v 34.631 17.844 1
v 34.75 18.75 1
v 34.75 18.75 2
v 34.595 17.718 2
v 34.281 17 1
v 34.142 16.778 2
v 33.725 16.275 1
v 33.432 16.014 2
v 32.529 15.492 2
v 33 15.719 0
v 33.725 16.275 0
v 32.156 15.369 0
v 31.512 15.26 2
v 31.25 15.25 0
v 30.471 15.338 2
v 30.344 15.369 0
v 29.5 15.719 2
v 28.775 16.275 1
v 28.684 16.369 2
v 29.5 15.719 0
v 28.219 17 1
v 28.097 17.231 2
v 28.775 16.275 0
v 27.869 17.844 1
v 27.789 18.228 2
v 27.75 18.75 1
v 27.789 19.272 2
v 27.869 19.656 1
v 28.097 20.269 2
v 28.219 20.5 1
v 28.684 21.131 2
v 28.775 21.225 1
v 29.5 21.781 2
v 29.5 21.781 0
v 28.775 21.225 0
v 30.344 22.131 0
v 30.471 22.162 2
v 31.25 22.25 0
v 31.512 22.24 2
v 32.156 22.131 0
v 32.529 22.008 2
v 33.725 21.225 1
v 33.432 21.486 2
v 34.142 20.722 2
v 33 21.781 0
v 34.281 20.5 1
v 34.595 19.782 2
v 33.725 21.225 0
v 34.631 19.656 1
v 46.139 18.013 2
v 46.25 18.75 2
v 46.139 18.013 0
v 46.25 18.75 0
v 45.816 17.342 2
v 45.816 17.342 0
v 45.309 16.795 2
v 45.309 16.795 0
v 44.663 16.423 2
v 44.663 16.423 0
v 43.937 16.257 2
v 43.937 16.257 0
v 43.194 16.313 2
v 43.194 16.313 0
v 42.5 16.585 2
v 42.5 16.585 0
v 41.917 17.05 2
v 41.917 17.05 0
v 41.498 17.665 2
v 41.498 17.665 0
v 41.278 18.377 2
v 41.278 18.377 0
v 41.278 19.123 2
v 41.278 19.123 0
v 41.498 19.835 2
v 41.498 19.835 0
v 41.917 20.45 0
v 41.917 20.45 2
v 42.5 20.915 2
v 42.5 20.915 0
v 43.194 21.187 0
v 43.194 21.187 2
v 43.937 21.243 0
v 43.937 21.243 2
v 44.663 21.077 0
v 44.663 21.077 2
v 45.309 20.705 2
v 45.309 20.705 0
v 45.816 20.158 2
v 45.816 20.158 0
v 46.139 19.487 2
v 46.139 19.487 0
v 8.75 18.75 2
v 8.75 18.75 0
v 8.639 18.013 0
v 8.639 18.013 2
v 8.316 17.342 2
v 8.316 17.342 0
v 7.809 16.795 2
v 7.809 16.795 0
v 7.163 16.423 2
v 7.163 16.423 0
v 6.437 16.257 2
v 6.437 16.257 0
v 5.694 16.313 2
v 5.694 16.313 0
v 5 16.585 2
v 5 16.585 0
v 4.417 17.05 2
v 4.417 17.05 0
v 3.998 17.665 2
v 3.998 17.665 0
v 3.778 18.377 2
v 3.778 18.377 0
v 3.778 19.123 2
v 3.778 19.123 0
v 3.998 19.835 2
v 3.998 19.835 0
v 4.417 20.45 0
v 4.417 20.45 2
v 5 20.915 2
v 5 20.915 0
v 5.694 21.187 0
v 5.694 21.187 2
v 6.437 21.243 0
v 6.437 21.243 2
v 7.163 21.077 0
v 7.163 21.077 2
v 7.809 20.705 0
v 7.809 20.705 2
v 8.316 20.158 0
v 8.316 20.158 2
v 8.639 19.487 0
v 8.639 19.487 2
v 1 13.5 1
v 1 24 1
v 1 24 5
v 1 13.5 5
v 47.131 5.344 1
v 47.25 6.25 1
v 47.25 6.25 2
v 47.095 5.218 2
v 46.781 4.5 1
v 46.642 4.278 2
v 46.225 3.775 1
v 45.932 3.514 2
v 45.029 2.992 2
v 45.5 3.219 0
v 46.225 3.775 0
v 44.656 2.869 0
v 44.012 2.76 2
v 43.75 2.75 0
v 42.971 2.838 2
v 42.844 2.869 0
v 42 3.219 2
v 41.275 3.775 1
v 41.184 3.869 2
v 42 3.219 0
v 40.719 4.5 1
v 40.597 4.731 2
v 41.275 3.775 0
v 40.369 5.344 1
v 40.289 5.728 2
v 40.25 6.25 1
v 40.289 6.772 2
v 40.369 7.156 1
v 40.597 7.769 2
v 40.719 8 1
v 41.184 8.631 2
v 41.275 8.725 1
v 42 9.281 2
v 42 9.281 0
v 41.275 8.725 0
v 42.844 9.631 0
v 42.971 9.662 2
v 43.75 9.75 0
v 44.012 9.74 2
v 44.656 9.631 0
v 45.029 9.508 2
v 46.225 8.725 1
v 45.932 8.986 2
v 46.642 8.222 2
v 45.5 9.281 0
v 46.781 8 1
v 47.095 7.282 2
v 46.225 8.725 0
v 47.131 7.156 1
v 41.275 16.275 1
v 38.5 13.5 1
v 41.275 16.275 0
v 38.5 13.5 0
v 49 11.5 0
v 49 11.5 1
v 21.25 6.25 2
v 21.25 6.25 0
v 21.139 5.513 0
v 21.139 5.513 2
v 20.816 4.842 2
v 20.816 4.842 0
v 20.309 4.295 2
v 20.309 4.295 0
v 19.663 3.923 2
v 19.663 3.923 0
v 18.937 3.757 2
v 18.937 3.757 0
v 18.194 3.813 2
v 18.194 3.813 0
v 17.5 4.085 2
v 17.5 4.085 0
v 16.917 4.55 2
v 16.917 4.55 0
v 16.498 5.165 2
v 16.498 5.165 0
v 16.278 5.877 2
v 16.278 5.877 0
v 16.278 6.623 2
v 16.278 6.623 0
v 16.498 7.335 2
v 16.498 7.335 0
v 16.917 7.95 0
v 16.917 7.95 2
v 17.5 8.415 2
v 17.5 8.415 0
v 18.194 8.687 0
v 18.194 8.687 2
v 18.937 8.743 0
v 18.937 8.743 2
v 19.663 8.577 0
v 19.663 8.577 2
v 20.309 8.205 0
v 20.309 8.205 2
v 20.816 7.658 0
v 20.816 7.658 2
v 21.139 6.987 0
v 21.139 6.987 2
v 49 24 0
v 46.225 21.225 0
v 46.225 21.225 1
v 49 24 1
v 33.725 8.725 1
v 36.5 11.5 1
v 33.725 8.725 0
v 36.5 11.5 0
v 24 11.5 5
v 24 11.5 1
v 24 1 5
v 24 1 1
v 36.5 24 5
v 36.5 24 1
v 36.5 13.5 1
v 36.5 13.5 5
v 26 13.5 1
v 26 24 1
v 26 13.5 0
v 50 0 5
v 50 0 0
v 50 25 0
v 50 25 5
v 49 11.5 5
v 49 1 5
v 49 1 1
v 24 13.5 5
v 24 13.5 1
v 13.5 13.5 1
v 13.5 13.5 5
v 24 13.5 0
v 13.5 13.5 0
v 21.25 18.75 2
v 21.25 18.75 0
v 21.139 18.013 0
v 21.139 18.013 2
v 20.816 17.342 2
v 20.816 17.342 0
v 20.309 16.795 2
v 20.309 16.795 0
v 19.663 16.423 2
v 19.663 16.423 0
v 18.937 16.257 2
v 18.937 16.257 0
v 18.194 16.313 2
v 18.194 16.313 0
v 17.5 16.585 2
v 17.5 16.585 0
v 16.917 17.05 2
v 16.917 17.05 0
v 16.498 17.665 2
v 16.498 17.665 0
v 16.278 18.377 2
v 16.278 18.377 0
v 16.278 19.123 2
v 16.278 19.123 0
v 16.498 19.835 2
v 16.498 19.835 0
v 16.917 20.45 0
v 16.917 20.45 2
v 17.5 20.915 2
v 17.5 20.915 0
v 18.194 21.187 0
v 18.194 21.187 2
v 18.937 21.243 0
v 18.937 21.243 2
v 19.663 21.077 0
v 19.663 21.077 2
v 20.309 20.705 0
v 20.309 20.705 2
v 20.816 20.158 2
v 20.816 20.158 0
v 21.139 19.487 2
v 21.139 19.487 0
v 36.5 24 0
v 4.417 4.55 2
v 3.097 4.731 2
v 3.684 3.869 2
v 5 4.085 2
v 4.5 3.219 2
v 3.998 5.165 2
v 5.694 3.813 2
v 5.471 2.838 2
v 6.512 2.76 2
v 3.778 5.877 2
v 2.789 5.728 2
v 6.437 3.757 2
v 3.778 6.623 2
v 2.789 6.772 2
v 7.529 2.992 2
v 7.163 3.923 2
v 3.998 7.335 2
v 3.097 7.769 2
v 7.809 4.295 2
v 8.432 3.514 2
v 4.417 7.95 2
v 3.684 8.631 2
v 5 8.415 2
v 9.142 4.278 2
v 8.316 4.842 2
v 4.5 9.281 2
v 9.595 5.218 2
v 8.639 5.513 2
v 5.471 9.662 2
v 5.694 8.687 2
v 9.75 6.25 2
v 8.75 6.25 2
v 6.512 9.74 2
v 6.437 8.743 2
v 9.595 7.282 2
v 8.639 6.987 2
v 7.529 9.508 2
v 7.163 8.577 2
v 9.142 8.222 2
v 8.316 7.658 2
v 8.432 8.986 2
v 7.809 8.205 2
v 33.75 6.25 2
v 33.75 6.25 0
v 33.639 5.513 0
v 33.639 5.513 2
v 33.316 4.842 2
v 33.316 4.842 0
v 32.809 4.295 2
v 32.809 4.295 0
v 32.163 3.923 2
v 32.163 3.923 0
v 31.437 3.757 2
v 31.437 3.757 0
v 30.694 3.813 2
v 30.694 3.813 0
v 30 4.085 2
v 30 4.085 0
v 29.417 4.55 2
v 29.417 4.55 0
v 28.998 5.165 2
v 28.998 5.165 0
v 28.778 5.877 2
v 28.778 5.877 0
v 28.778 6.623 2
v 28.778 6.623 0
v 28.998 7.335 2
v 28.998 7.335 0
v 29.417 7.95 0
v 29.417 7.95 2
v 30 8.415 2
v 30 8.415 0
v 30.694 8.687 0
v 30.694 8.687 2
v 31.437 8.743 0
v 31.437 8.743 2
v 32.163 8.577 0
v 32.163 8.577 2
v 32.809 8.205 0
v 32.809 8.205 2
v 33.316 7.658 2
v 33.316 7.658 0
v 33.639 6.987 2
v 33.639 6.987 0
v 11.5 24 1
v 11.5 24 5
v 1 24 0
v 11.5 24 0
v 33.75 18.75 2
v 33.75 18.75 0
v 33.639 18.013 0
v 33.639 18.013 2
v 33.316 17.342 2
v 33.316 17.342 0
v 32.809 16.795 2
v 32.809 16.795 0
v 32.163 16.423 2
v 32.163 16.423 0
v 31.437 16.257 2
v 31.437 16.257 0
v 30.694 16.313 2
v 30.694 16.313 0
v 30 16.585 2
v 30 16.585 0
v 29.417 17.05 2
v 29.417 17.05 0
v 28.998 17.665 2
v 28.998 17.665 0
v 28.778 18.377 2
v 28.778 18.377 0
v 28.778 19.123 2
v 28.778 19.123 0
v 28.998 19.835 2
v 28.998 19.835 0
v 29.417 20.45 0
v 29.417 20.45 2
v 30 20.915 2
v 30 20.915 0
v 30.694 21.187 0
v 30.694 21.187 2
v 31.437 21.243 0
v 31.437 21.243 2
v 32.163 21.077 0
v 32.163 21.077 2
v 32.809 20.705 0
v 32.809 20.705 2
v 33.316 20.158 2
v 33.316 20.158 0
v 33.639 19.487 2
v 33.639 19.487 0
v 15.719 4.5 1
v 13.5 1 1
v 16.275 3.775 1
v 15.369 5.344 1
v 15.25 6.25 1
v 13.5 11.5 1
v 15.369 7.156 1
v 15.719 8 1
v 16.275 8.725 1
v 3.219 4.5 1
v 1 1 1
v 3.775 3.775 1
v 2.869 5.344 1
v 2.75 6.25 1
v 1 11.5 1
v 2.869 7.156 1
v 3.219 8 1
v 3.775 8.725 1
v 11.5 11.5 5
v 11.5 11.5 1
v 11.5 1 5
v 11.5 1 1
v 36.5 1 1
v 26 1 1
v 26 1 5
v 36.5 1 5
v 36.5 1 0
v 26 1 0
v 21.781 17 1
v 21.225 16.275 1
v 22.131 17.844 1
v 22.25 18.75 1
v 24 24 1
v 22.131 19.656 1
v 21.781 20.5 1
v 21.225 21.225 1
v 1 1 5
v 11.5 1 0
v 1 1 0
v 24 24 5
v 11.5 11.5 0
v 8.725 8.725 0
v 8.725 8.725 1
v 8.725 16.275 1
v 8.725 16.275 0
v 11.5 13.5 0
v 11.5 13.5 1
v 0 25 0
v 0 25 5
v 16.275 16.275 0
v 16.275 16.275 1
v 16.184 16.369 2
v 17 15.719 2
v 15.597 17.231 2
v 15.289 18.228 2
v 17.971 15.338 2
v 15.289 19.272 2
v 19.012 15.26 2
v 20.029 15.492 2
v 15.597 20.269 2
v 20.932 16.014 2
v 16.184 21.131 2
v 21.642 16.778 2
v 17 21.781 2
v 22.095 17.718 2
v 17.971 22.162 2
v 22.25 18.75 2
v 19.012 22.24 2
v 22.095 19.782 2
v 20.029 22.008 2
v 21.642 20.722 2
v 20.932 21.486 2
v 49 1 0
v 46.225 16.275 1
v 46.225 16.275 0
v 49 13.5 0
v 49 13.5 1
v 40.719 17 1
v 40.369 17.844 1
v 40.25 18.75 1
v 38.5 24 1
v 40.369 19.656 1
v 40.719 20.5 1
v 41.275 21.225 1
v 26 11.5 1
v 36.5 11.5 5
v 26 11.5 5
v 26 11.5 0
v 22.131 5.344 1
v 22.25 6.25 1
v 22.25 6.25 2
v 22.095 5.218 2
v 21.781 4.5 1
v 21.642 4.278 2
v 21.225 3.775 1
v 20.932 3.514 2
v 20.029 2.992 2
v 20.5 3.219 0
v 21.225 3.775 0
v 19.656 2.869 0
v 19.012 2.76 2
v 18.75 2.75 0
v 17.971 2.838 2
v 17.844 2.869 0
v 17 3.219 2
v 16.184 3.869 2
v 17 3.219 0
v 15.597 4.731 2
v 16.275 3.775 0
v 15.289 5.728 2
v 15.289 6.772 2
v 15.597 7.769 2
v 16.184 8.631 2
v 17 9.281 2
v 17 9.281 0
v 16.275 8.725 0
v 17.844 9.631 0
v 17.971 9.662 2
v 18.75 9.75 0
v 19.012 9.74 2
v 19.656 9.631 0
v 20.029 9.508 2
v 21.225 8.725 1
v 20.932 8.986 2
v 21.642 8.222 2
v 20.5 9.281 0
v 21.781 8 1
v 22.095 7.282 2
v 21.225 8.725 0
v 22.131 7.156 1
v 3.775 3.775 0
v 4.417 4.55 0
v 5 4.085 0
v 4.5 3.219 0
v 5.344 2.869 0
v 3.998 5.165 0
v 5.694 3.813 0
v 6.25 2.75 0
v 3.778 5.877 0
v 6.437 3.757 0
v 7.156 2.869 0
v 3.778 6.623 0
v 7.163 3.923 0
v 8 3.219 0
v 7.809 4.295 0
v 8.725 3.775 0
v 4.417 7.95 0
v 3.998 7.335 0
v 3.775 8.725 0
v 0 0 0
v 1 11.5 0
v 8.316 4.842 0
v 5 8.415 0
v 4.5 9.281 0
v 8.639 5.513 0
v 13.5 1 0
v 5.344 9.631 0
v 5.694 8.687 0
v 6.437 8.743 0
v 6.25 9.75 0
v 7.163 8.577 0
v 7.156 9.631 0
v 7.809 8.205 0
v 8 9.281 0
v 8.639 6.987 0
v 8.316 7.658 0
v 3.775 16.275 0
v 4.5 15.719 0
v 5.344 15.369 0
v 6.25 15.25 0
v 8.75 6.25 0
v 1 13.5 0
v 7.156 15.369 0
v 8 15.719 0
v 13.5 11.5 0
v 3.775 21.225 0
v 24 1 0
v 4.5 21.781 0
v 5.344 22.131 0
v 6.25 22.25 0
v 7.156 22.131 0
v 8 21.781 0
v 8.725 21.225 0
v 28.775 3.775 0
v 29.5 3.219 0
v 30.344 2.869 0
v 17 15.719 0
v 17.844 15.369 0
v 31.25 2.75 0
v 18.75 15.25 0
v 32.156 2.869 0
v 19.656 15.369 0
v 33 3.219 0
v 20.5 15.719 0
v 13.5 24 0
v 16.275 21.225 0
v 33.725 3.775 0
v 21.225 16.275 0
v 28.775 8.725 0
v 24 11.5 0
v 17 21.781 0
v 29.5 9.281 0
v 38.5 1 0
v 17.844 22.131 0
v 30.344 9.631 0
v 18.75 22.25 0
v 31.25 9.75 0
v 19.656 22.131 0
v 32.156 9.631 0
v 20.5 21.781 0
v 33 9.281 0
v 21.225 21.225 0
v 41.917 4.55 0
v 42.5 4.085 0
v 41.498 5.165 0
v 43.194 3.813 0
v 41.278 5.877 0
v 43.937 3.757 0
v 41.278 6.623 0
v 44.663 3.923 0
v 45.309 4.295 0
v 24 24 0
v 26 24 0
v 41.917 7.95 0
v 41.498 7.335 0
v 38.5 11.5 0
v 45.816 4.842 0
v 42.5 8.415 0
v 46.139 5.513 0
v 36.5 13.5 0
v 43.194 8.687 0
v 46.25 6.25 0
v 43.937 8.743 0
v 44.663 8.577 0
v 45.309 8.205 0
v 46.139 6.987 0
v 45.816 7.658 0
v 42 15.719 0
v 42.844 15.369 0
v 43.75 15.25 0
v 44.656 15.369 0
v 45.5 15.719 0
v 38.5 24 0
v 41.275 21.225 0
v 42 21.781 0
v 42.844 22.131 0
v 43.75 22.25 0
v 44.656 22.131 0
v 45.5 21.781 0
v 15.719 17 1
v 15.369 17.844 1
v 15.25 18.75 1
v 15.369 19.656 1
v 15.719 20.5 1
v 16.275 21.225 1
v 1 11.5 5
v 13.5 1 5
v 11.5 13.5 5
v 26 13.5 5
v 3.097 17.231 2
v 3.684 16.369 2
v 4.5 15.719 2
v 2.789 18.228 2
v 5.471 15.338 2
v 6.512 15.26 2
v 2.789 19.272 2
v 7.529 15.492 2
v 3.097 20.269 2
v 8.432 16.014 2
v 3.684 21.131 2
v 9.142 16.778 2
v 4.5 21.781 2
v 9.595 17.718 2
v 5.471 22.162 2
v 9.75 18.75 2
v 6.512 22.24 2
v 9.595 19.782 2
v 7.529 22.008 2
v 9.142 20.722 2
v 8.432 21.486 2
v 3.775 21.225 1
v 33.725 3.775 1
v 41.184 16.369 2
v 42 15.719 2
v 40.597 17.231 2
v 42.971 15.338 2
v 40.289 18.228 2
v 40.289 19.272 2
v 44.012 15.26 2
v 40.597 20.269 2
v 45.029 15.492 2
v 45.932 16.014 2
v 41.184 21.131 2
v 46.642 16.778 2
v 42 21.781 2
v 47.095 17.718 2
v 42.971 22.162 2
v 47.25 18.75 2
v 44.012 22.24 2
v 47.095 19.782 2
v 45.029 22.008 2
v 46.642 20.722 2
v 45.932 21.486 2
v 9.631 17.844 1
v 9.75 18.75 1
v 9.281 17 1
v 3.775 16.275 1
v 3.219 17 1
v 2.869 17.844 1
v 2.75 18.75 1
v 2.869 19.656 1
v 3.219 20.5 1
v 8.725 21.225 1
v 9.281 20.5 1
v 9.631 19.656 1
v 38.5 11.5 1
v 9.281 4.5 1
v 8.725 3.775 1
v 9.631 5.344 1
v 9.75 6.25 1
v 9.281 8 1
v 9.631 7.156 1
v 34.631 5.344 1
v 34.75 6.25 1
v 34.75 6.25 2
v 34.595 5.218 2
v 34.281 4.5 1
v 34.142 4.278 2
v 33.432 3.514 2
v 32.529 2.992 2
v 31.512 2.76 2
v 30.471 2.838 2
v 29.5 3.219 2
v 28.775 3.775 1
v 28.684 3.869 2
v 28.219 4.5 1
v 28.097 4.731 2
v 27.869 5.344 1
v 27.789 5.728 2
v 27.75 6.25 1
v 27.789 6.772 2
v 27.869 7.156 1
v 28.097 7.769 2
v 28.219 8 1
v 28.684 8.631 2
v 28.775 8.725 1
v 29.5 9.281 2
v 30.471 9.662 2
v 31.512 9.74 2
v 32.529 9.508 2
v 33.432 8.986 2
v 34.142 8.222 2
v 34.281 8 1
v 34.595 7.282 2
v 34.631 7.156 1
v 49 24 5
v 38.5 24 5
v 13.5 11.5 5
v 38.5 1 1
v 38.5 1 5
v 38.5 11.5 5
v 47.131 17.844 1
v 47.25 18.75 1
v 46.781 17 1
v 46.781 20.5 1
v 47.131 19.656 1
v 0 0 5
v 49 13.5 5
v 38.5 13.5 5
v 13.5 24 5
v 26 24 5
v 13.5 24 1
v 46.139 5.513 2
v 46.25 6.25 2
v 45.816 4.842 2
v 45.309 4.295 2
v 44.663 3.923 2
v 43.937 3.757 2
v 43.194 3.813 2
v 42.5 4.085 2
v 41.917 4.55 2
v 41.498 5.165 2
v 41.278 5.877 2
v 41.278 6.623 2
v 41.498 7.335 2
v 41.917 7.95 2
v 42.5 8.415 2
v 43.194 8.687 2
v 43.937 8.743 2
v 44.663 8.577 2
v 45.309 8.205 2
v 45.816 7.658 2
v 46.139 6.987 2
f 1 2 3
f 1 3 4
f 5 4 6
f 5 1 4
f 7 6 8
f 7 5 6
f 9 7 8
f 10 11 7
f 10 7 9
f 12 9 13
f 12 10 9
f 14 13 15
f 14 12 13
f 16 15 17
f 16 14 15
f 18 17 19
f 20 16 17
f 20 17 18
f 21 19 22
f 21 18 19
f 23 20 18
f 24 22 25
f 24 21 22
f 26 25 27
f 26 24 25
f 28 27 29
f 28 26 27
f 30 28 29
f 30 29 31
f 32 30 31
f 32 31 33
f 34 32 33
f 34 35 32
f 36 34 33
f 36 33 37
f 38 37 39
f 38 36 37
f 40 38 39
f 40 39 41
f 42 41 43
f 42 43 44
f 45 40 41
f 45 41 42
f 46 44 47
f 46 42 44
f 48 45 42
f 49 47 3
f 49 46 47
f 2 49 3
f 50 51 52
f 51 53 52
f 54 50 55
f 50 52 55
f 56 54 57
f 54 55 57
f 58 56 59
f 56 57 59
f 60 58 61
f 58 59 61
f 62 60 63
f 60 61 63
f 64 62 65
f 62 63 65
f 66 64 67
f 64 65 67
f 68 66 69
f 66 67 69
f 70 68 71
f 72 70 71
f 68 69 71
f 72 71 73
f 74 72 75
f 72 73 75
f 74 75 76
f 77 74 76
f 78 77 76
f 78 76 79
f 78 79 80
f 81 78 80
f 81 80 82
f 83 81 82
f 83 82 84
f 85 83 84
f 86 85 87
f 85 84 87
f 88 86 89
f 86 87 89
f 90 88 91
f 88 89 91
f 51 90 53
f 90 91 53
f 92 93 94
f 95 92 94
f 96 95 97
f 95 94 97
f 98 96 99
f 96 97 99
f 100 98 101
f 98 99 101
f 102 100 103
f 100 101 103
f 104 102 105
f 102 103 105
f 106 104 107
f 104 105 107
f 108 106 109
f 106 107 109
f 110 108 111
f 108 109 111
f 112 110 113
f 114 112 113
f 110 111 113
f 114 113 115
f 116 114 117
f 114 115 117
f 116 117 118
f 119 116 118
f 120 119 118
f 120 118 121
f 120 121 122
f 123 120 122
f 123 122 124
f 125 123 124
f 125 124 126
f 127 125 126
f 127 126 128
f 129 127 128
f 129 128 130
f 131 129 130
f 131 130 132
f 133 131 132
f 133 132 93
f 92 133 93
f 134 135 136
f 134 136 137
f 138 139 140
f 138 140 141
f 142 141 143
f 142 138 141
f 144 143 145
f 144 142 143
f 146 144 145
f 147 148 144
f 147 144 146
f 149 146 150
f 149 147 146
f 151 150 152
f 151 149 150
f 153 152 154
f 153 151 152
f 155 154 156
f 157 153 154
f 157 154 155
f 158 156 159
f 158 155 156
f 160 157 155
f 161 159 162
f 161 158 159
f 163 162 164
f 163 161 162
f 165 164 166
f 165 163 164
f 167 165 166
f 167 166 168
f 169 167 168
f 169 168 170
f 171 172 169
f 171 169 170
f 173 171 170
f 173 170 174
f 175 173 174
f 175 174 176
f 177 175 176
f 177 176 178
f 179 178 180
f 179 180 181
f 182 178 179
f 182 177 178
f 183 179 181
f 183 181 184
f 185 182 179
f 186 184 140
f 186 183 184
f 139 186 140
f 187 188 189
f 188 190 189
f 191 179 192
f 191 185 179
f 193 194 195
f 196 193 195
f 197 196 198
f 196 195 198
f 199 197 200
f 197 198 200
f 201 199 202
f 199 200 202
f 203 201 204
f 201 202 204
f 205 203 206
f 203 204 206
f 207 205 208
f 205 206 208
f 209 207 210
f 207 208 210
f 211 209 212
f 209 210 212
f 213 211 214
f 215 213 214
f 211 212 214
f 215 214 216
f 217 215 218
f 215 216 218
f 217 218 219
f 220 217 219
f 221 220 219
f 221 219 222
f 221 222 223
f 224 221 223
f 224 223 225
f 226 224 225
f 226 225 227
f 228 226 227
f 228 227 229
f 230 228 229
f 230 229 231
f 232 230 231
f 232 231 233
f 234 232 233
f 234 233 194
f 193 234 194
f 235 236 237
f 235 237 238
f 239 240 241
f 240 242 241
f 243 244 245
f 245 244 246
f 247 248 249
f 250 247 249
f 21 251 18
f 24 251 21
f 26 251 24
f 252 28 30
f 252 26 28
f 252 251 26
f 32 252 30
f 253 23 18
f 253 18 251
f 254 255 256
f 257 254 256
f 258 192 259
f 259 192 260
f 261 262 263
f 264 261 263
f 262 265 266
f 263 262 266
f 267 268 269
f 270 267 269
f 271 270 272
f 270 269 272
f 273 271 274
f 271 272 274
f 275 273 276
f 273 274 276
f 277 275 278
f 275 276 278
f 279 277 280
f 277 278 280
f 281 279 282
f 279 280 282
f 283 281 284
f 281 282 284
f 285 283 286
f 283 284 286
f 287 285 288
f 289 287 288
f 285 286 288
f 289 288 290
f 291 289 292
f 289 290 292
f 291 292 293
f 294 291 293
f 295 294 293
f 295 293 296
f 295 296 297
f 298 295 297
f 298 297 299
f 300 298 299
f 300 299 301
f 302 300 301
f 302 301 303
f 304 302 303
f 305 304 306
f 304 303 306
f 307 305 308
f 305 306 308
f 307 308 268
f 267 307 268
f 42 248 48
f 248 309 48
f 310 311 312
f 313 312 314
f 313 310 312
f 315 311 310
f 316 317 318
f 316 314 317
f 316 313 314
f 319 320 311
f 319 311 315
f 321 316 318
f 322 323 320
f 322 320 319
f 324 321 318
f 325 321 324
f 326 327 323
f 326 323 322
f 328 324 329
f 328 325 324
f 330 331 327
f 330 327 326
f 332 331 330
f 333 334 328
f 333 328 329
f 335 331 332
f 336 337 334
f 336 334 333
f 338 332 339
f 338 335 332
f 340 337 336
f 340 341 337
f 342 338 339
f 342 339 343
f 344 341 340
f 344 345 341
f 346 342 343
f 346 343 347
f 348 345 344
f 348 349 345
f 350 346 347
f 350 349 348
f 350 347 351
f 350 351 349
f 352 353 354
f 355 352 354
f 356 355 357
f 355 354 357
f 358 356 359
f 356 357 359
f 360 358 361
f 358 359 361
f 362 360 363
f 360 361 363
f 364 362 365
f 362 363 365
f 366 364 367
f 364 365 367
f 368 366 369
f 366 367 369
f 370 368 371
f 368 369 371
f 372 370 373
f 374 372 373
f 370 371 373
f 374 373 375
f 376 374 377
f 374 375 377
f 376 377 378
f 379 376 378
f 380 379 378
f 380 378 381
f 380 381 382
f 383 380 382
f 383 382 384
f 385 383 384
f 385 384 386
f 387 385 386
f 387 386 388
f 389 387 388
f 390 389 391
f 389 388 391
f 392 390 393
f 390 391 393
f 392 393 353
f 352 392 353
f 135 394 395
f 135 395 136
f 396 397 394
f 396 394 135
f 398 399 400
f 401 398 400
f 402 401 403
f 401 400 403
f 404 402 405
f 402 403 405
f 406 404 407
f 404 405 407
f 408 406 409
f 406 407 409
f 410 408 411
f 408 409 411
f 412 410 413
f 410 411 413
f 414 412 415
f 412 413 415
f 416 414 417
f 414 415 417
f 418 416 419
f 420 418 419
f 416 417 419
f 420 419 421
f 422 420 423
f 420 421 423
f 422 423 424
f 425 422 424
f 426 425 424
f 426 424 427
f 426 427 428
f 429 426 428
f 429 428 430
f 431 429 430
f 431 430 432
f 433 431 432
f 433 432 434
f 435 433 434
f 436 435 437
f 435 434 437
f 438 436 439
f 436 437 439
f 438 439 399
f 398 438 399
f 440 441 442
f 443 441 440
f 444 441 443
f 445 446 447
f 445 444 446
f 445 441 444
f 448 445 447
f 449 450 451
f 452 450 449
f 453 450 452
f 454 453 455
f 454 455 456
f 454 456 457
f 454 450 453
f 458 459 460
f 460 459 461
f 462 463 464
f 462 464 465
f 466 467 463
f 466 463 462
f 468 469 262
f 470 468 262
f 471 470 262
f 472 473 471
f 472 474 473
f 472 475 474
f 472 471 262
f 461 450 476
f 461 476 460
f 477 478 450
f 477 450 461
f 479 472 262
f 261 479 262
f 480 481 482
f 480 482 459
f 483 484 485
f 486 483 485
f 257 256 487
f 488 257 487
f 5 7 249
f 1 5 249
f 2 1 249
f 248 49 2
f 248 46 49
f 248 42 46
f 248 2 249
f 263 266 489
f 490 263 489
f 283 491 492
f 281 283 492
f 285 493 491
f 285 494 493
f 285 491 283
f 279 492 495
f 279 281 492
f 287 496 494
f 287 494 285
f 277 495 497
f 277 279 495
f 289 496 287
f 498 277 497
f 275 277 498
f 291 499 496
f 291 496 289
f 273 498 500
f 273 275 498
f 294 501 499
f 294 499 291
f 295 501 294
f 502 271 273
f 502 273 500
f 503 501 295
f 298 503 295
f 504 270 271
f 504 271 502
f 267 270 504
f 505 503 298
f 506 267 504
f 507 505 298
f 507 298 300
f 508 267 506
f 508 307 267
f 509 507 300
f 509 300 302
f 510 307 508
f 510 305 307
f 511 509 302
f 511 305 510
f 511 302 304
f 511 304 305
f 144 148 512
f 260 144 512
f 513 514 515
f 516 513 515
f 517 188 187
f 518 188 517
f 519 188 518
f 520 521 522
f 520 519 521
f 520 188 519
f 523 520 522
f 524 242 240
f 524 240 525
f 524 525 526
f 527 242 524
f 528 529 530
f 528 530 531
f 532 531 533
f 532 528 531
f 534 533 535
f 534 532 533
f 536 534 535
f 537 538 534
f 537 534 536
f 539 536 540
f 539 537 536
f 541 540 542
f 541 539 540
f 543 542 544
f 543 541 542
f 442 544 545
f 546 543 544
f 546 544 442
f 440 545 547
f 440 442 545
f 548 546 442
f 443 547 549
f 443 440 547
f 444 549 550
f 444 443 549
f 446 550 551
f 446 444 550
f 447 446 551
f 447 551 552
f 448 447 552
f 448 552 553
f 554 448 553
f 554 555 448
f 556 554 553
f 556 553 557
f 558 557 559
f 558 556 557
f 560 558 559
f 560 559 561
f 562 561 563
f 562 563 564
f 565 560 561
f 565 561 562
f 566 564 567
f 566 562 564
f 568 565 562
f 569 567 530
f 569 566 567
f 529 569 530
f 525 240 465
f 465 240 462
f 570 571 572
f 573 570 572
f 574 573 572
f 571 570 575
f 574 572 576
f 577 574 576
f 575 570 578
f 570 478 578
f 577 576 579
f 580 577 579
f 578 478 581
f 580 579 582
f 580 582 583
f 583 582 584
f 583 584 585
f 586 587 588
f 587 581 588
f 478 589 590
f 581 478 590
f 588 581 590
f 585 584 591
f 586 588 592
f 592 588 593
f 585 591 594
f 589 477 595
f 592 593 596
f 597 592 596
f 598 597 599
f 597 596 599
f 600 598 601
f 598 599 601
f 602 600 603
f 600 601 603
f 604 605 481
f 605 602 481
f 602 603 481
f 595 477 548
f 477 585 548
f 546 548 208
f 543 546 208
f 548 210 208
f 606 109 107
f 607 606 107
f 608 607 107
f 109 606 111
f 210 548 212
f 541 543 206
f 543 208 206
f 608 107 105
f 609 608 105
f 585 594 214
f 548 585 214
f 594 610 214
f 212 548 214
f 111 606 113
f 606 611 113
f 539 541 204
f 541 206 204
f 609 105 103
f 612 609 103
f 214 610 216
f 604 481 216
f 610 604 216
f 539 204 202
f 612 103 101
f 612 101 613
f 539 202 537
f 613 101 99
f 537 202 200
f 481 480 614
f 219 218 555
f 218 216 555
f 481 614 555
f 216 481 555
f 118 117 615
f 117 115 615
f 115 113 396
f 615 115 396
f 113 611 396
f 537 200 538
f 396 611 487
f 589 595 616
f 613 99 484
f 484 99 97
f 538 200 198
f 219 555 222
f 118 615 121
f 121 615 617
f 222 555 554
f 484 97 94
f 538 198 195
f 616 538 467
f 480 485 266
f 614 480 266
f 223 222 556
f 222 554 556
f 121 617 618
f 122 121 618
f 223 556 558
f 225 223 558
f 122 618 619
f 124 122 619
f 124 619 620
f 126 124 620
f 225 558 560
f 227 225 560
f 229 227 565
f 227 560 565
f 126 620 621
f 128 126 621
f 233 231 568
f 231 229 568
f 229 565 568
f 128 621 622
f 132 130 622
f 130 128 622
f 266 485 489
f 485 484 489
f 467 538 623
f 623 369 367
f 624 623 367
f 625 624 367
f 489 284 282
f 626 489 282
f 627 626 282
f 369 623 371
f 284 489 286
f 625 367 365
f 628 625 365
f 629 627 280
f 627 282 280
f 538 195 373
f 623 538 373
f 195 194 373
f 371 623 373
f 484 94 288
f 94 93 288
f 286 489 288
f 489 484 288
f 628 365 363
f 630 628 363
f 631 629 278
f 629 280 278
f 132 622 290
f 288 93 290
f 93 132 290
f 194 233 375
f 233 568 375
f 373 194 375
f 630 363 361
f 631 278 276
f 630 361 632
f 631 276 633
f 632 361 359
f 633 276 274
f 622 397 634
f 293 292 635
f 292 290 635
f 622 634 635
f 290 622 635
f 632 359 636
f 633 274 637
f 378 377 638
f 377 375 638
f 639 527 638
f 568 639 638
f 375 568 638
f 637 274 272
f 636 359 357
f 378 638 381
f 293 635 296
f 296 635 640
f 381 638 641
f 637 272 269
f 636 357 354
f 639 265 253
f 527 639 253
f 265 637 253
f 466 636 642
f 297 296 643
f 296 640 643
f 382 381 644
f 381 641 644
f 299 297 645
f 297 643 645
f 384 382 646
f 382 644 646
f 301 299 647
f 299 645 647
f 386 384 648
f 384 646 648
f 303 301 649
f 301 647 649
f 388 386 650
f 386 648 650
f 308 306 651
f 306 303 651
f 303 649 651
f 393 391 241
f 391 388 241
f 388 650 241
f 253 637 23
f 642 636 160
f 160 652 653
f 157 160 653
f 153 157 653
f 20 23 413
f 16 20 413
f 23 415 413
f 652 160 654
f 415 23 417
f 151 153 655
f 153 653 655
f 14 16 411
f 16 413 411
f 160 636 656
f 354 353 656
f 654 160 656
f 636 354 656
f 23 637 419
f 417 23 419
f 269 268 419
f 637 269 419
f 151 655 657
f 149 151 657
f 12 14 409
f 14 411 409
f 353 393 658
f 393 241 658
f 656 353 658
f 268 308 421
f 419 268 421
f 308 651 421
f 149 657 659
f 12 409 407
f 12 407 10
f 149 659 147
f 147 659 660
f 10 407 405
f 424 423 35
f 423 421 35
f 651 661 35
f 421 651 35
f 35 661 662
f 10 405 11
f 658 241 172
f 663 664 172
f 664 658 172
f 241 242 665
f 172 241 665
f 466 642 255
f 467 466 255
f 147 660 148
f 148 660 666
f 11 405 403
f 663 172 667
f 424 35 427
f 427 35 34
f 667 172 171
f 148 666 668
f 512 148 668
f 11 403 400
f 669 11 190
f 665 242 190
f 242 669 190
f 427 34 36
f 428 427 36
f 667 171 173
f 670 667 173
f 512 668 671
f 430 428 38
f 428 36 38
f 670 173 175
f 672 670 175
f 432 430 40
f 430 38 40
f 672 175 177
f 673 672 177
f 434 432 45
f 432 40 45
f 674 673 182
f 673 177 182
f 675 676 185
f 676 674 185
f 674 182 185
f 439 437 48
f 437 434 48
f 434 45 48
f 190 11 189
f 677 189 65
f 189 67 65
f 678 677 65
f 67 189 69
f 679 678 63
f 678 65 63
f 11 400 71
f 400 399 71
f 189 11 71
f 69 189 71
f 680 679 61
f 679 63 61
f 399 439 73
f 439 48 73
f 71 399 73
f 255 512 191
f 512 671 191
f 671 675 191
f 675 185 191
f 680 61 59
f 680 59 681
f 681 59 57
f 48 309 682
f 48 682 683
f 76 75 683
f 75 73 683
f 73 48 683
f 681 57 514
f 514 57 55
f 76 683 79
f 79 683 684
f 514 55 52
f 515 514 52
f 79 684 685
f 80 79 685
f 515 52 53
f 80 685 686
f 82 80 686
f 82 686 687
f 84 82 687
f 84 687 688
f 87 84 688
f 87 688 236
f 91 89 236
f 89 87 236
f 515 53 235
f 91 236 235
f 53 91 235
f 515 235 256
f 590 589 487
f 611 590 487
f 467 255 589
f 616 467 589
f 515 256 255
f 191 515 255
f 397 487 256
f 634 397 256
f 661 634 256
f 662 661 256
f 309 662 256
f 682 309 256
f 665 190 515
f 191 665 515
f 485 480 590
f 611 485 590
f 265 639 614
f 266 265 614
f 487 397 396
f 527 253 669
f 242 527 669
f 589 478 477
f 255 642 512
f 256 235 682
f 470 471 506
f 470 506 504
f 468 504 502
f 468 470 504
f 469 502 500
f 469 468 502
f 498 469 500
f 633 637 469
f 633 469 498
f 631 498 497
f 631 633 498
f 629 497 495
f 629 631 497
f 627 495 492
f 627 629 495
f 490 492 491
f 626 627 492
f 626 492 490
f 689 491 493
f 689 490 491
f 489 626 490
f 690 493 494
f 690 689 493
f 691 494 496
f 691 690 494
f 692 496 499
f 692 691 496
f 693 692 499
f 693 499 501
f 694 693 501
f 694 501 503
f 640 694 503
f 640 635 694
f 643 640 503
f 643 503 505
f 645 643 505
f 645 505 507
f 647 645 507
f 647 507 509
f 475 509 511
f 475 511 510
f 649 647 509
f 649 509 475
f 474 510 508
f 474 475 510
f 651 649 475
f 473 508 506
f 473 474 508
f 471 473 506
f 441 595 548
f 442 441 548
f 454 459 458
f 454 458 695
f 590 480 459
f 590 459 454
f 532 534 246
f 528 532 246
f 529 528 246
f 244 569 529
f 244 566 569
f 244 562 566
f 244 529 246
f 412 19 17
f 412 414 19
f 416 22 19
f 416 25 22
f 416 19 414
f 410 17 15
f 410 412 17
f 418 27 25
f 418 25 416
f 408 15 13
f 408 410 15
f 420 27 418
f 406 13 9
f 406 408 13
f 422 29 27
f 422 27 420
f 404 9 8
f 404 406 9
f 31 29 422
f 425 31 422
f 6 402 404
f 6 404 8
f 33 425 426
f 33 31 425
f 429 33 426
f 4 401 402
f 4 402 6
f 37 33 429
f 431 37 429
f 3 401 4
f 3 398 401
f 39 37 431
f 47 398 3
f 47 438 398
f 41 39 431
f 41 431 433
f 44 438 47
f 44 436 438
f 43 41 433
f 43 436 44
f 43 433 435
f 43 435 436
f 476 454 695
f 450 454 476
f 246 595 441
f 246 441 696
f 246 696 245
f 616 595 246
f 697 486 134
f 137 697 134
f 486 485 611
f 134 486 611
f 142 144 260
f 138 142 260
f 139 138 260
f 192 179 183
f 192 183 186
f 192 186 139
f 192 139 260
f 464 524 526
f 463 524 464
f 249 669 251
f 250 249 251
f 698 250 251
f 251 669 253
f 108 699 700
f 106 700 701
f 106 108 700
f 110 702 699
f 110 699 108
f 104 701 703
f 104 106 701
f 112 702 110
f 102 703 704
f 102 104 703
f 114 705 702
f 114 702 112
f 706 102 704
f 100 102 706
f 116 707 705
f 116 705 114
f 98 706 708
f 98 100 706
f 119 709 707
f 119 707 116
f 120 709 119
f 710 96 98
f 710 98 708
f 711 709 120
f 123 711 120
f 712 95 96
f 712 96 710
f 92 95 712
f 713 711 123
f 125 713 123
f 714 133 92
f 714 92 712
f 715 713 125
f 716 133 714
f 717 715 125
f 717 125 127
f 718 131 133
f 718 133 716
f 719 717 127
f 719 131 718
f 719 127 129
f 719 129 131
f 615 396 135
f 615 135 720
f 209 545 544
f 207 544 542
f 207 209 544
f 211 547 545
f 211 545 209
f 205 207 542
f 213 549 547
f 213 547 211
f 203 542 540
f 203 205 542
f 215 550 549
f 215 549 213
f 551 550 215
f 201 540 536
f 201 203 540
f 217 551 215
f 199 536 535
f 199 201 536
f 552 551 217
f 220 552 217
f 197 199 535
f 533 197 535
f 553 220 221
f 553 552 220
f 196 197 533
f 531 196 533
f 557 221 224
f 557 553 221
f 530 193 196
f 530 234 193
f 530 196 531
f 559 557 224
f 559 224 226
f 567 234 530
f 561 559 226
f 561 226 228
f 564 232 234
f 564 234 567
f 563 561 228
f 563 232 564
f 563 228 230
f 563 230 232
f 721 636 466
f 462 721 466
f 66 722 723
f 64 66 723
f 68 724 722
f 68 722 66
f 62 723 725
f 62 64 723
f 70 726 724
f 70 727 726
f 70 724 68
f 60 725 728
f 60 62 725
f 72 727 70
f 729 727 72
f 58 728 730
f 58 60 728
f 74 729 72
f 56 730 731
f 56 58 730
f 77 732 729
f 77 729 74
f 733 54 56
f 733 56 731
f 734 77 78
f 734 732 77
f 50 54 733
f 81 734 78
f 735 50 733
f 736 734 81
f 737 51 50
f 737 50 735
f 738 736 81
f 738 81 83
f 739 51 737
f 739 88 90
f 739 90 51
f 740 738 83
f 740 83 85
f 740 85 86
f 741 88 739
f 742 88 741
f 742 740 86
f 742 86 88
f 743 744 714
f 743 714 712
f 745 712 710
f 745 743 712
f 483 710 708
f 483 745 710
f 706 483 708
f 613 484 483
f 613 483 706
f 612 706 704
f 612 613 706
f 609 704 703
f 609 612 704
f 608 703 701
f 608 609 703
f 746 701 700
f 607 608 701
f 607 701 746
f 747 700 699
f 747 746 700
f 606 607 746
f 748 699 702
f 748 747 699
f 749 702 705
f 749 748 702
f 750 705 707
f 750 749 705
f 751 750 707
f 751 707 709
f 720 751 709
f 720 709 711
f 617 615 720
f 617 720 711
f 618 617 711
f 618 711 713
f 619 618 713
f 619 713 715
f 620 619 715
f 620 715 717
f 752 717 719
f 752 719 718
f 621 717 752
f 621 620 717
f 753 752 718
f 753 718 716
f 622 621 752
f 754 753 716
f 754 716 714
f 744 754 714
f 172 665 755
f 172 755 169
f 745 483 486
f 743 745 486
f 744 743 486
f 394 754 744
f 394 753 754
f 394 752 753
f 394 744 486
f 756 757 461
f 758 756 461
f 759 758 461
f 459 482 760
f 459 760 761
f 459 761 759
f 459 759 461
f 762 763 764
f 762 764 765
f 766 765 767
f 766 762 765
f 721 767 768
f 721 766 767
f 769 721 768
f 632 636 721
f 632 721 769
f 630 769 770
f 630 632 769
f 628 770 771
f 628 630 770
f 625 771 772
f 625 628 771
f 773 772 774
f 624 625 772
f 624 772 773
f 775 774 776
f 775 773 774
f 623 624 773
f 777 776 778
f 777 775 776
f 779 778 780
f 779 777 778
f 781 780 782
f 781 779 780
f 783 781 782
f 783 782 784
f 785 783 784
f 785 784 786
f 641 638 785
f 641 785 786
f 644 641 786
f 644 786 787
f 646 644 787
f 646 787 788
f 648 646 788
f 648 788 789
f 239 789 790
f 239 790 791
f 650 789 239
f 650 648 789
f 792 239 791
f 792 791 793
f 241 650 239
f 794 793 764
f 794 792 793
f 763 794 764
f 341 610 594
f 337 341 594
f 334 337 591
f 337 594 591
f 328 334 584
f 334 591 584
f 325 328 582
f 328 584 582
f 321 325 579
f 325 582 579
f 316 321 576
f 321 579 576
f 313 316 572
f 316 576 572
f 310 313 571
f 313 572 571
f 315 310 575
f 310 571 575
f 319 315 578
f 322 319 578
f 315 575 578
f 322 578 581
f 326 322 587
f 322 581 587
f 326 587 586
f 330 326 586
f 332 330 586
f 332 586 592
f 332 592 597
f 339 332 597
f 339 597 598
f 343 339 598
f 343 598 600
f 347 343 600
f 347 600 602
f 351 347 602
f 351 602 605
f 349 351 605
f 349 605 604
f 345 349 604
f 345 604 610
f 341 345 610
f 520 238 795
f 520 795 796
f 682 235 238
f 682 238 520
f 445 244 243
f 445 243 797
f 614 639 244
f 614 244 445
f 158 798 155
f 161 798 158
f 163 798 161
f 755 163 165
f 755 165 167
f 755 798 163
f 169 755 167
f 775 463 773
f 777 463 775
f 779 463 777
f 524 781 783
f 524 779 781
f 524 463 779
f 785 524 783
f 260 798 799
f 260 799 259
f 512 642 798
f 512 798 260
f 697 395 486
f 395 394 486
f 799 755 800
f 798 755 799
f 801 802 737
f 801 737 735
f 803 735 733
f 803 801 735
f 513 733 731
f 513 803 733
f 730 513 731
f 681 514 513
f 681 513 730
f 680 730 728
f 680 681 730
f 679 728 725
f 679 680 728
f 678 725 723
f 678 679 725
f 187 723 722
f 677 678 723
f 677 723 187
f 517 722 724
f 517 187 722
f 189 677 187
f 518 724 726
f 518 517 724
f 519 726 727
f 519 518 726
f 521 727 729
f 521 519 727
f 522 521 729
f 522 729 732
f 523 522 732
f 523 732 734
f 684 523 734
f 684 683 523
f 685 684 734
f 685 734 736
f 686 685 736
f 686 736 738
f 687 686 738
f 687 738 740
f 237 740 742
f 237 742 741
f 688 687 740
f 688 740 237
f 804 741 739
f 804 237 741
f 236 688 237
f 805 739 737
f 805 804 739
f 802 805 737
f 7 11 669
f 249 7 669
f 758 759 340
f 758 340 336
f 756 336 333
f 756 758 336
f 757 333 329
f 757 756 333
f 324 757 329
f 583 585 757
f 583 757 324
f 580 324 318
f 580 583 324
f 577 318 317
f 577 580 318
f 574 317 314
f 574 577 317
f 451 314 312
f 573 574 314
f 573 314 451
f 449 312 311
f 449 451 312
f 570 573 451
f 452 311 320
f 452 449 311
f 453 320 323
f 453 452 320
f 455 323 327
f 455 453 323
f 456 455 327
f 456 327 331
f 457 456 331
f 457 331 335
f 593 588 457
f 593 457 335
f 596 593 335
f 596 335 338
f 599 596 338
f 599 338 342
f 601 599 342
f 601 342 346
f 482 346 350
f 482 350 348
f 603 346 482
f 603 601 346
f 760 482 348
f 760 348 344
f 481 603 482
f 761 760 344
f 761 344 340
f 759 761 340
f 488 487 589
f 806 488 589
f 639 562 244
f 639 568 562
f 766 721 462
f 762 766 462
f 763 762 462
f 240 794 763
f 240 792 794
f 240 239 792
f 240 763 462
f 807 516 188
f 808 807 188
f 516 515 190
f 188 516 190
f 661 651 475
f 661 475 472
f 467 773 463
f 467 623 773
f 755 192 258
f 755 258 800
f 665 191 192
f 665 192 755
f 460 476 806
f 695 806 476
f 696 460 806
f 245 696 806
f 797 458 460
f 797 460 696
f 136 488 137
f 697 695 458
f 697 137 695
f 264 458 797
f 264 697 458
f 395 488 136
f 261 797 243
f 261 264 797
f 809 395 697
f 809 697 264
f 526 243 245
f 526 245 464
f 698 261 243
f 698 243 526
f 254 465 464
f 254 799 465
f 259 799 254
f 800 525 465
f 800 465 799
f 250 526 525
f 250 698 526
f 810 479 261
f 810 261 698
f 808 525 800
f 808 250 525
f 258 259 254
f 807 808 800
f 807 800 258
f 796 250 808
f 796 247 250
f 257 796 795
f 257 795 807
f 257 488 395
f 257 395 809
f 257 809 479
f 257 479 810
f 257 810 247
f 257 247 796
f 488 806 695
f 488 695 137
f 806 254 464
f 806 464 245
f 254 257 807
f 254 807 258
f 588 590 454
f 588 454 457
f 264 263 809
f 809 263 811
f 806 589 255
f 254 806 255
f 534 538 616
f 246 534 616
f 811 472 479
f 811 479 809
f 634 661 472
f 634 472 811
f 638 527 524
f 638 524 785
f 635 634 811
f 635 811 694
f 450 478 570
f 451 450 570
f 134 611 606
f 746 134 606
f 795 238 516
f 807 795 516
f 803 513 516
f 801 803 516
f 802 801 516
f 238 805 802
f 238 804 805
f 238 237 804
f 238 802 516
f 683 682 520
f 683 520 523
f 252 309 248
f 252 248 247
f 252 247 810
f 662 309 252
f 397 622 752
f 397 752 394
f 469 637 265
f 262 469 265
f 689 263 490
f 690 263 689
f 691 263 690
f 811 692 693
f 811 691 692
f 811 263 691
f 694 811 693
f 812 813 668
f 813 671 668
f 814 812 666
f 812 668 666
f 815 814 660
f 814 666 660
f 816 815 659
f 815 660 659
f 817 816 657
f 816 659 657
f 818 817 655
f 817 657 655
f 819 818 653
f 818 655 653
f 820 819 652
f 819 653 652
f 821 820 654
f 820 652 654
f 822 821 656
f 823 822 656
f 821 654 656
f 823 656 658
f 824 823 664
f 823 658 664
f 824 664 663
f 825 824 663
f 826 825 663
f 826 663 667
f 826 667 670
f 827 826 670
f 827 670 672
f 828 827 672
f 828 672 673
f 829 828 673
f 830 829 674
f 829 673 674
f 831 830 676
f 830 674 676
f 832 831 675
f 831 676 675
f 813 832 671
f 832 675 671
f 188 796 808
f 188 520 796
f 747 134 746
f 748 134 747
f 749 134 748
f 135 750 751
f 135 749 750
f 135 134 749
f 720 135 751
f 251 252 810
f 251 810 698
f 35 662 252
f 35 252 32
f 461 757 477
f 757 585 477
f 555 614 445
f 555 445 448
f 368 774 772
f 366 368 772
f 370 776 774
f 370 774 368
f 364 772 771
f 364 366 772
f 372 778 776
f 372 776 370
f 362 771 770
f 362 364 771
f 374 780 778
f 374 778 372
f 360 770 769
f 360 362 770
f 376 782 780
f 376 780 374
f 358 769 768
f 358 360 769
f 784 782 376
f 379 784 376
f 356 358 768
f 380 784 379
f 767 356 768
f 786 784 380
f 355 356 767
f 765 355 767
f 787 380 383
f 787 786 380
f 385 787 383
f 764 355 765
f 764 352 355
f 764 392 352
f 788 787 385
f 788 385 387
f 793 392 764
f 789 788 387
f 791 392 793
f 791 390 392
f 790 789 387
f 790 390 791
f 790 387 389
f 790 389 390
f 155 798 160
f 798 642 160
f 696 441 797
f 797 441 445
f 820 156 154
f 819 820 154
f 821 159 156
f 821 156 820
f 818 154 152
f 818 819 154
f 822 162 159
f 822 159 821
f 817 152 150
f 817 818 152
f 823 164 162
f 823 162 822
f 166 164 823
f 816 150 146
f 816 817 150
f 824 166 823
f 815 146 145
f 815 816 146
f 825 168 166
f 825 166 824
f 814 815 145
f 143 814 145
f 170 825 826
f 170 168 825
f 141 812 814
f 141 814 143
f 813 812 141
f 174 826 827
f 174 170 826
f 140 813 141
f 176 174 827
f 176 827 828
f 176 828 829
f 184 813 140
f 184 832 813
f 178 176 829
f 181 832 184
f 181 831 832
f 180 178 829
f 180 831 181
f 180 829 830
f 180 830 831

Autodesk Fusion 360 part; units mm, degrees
sketch "Sketch1" plane through (0, 0, 0) normal (0, 0, 1) x (1, 0, 0)
  line L0 (0, 0) -> (50, 0)
  line L1 (50, 0) -> (50, 25)
  line L2 (50, 25) -> (0, 25)
  line L3 (0, 25) -> (0, 0)
  line L4 (-2.5, -2.5) -> (52.5, -2.5)
  line L5 (52.5, -2.5) -> (52.5, 27.5)
  line L6 (52.5, 27.5) -> (-2.5, 27.5)
  line L7 (-2.5, 27.5) -> (-2.5, -2.5)
  line L8 (0, 25) -> (12.5, 25)
  line L9 (12.5, 25) -> (12.5, 12.5)
  line L10 (12.5, 12.5) -> (0, 12.5)
  line L11 (0, 12.5) -> (0, 25)
  line L12 (12.5, 12.5) -> (0, 12.5)
  line L13 (0, 12.5) -> (0, 0)
  line L14 (0, 0) -> (12.5, 0)
  line L15 (12.5, 0) -> (12.5, 12.5)
  line L16 (12.5, 12.5) -> (25, 12.5)
  line L17 (25, 12.5) -> (25, 25)
  line L18 (25, 25) -> (12.5, 25)
  line L19 (12.5, 25) -> (12.5, 12.5)
  line L20 (12.5, 12.5) -> (25, 12.5)
  line L21 (25, 12.5) -> (25, 0)
  line L22 (25, 0) -> (12.5, 0)
  line L23 (12.5, 0) -> (12.5, 12.5)
  line L24 (25, 12.5) -> (37.5, 12.5)
  line L25 (37.5, 12.5) -> (37.5, 25)
  line L26 (37.5, 25) -> (25, 25)
  line L27 (25, 25) -> (25, 12.5)
  line L28 (37.5, 12.5) -> (25, 12.5)
  line L29 (25, 12.5) -> (25, 0)
  line L30 (25, 0) -> (37.5, 0)
  line L31 (37.5, 0) -> (37.5, 12.5)
  line L32 (37.5, 12.5) -> (50, 12.5)
  line L33 (50, 12.5) -> (50, 0)
  line L34 (50, 0) -> (37.5, 0)
  line L35 (37.5, 0) -> (37.5, 12.5)
  line L36 (0, 25) -> (1, 25)
  line L37 (1, 25) -> (1, 0)
  line L38 (1, 0) -> (0, 0)
  line L39 (0, 0) -> (0, 25)
  line L40 (0, 25) -> (50, 25)
  line L41 (50, 25) -> (50, 24)
  line L42 (50, 24) -> (0, 24)
  line L43 (0, 24) -> (0, 25)
  line L44 (50, 0) -> (0, 0)
  line L45 (0, 0) -> (0, 1)
  line L46 (0, 1) -> (50, 1)
  line L47 (50, 1) -> (50, 0)
  line L48 (50, 25) -> (49, 25)
  line L49 (49, 25) -> (49, 0)
  line L50 (49, 0) -> (50, 0)
  line L51 (50, 0) -> (50, 25)
  line L52 (0, 12.5) -> (50, 12.5)
  line L53 (50, 12.5) -> (50, 11.5)
  line L54 (50, 11.5) -> (0, 11.5)
  line L55 (0, 11.5) -> (0, 12.5)
  line L56 (0, 12.5) -> (50, 12.5)
  line L57 (50, 12.5) -> (50, 13.5)
  line L58 (50, 13.5) -> (0, 13.5)
  line L59 (0, 13.5) -> (0, 12.5)
  line L60 (50, 25) -> (49, 25)
  line L61 (49, 25) -> (49, 0)
  line L62 (49, 0) -> (50, 0)
  line L63 (50, 0) -> (50, 25)
  line L64 (12.5, 0) -> (13.5, 0)
  line L65 (13.5, 0) -> (13.5, 25)
  line L66 (13.5, 25) -> (12.5, 25)
  line L67 (12.5, 25) -> (12.5, 0)
  line L68 (12.5, 25) -> (11.5, 25)
  line L69 (11.5, 25) -> (11.5, 0)
  line L70 (11.5, 0) -> (12.5, 0)
  line L71 (12.5, 0) -> (12.5, 25)
  line L72 (25, 25) -> (26, 25)
  line L73 (26, 25) -> (26, 0)
  line L74 (26, 0) -> (25, 0)
  line L75 (25, 0) -> (25, 25)
  line L76 (25, 25) -> (24, 25)
  line L77 (24, 25) -> (24, 0)
  line L78 (24, 0) -> (25, 0)
  line L79 (25, 0) -> (25, 25)
  line L80 (37.5, 25) -> (38.5, 25)
  line L81 (38.5, 25) -> (38.5, 0)
  line L82 (38.5, 0) -> (37.5, 0)
  line L83 (37.5, 0) -> (37.5, 25)
  line L84 (37.5, 25) -> (36.5, 25)
  line L85 (36.5, 25) -> (36.5, 0)
  line L86 (36.5, 0) -> (37.5, 0)
  line L87 (37.5, 0) -> (37.5, 25)
  line L88 (1, 24) -> (11.5, 13.5)
  line L89 (1, 13.5) -> (11.5, 24)
  line L90 (1, 11.5) -> (11.5, 1)
  line L91 (1, 1) -> (11.5, 11.5)
  line L92 (13.5, 24) -> (24, 13.5)
  line L93 (13.5, 13.5) -> (24, 24)
  line L94 (13.5, 11.5) -> (24, 1)
  line L95 (13.5, 1) -> (24, 11.5)
  line L96 (26, 11.5) -> (36.5, 1)
  line L97 (26, 1) -> (26, 1.4048)
  line L98 (36.5, 11.5) -> (26, 1)
  line L99 (36.5, 24) -> (26, 13.5)
  line L100 (26, 24) -> (36.5, 13.5)
  line L101 (38.5, 24) -> (49, 13.5)
  line L102 (38.5, 13.5) -> (49, 24)
  line L103 (38.5, 11.5) -> (49, 1)
  line L104 (38.5, 1) -> (49, 11.5)
  circle A0 centre (6.25, 18.75) radius 2.5
  circle A1 centre (18.75, 18.75) radius 2.5
  circle A2 centre (31.25, 18.75) radius 2.5
  circle A3 centre (43.75, 18.75) radius 2.5
  circle A4 centre (43.75, 6.25) radius 2.5
  circle A5 centre (31.25, 6.25) radius 2.5
  circle A6 centre (18.75, 6.25) radius 2.5
  circle A7 centre (6.25, 6.25) radius 2.5
  circle A8 centre (18.75, 6.25) radius 3.5
  circle A9 centre (31.25, 6.25) radius 3.5
  circle A10 centre (31.25, 18.75) radius 3.5
  circle A11 centre (18.75, 18.75) radius 3.5
  circle A12 centre (6.25, 18.75) radius 3.5
  circle A13 centre (43.75, 18.75) radius 3.5
  circle A14 centre (6.25, 6.25) radius 3.5
  circle A15 centre (43.75, 6.25) radius 3.5
  dimension "d1" = 50
  dimension "d2" = 25
  dimension "d3" = 2.5
  dimension "d4" = 12.5
  dimension "d5" = 12.5
  dimension "d6" = 12.5
  dimension "d7" = 12.5
  dimension "d8" = 12.5
  dimension "d9" = 12.5
  dimension "d10" = 12.5
  dimension "d11" = 12.5
  dimension "d12" = 12.5
  dimension "d13" = 12.5
  dimension "d14" = 12.5
  dimension "d15" = 1
  dimension "d16" = 1
  dimension "d17" = 1
  dimension "d18" = 1
  dimension "d19" = 25
  dimension "d20" = 50
  dimension "d21" = 1
  dimension "d22" = 50
  dimension "d23" = 1
  dimension "d24" = 1
  dimension "d25" = 1
  dimension "d26" = 25
  dimension "d27" = 1
  dimension "d28" = 1
  dimension "d29" = 1
  dimension "d30" = 1
  dimension "d31" = 5
  dimension "d32" = 5
  dimension "d33" = 5
  dimension "d34" = 5
  dimension "d35" = 5
  dimension "d36" = 5
  dimension "d37" = 5
  dimension "d38" = 5
  dimension "d39" = 1
  dimension "d40" = 1
  dimension "d41" = 1
  dimension "d42" = 1
  dimension "d43" = 1
  dimension "d44" = 1
  dimension "d51" = 1
  dimension "d52" = 1
extrude "Extrude2" add sketch "Sketch1" along normal blind 5 contours L0 L3 L13 L14 L37 L38 L39 L44 L45 L46 | L0 L14 L37 L44 L46 L69 | L3 L13 L37 L39 L46 L54 | L0 L14 L15 L23 L44 L46 L67 L69 L70 L71 | L3 L10 L12 L13 L37 L39 L52 L54 L55 L56 | L0 L15 L22 L23 L44 L46 L64 L65 L67 L71 | L15 L23 L46 L54 L67 L69 L71 | L10 L12 L37 L52 L54 L56 L69 | L3 L10 L11 L12 L37 L39 L52 L56 L58 L59 | L0 L22 L44 L46 L65 L77 | L15 L23 L46 L54 L65 L67 L71 | L10 L12 L15 L23 L52 L54 L56 L67 L69 L71 | L10 L12 L37 L52 L56 L58 L69 | L3 L11 L37 L39 L42 L58 | L0 L21 L22 L29 L44 L46 L75 L77 L78 L79 | L15 L16 L20 L23 L52 L54 L56 L65 L67 L71 | L9 L10 L12 L19 L52 L56 L58 L67 L69 L71 | L2 L3 L8 L11 L36 L37 L39 L40 L42 L43 | L0 L21 L29 L30 L44 L46 L73 L74 L75 L79 | L21 L29 L46 L54 L75 L77 L79 | L16 L20 L52 L54 L56 L65 L77 | L9 L16 L19 L20 L52 L56 L58 L65 L67 L71 | L9 L19 L42 L58 L67 L69 L71 | L2 L8 L37 L40 L42 L69 | L0 L30 L44 L46 L73 L85 | L21 L29 L46 L54 L73 L75 L79 L97 | L16 L20 L21 L29 L52 L54 L56 L75 L77 L79 | L16 L20 L52 L56 L58 L65 L77 | L9 L19 L42 L58 L65 L67 L71 | L2 L8 L9 L19 L40 L42 L67 L68 L69 L71 | L0 L30 L31 L35 L44 L46 L83 L85 L86 L87 | L21 L24 L28 L29 L52 L54 L56 L73 L75 L79 | L16 L17 L20 L27 L52 L56 L58 L75 L77 L79 | L2 L9 L18 L19 L40 L42 L65 L66 L67 L71 | L0 L31 L34 L35 L44 L46 L81 L82 L83 L87 | L31 L35 L46 L54 L83 L85 L87 | L17 L24 L27 L28 L52 L56 L58 L73 L75 L79 | L24 L28 L52 L54 L56 L73 L85 | L17 L27 L42 L58 L75 L77 L79 | L2 L18 L40 L42 L65 L77 | L0 L34 L44 L46 L49 L61 L81 | L31 L35 L46 L54 L81 L83 L87 | L24 L28 L31 L35 L52 L54 L56 L83 L85 L87 | L17 L27 L42 L58 L73 L75 L79 | L24 L28 L52 L56 L58 L73 L85 | L2 L17 L18 L27 L40 L42 L75 L76 L77 L79 | L0 L1 L33 L34 L44 L46 L47 L49 L50 L51 L61 L62 L63 | L31 L32 L35 L52 L54 L56 L81 L83 L87 | L24 L25 L28 L52 L56 L58 L83 L85 L87 | L2 L17 L26 L27 L40 L42 L72 L73 L75 L79 | L1 L33 L46 L49 L51 L54 L61 L63 | L32 L49 L52 L54 L56 L61 L81 | L25 L32 L52 L56 L58 L81 L83 L87 | L25 L42 L58 L83 L85 L87 | L2 L26 L40 L42 L73 L85 | L1 L32 L33 L49 L51 L52 L53 L54 L56 L61 L63 | L32 L49 L52 L56 L58 L61 L81 | L25 L42 L58 L81 L83 L87 | L2 L25 L26 L40 L42 L83 L84 L85 L87 | L1 L32 L49 L51 L52 L56 L57 L58 L61 L63 | L2 L25 L40 L42 L80 L81 L83 L87 | L1 L42 L49 L51 L58 L61 L63 | L2 L40 L42 L49 L61 L81 | L1 L2 L40 L41 L42 L48 L49 L51 L60 L61 L63 makes body 1
extrude "Extrude1" add sketch "Sketch1" along normal blind 2 separate body contours L90 L91 A7 A14 | L90 L91 A7 A14 | L90 L91 A7 A14 | L90 L91 A7 A14 | L94 L95 A6 A8 | L94 L95 A6 A8 | L88 L89 A0 A12 | L88 L89 A0 A12 | L94 L95 A6 A8 | L94 L95 A6 A8 | L88 L89 A0 A12 | L88 L89 A0 A12 | L96 L98 A5 A9 | L96 L98 A5 A9 | L92 L93 A1 A11 | L92 L93 A1 A11 | L96 L98 A5 A9 | L96 L98 A5 A9 | L92 L93 A1 A11 | L92 L93 A1 A11 | L103 L104 A4 A15 | L103 L104 A4 A15 | L99 L100 A2 A10 | L99 L100 A2 A10 | L103 L104 A4 A15 | L103 L104 A4 A15 | L99 L100 A2 A10 | L99 L100 A2 A10 | L101 L102 A3 A13 | L101 L102 A3 A13 | L101 L102 A3 A13 | L101 L102 A3 A13 makes body 2 at (9.7326, 19.0985, 1.3333) makes body 3 at (34.7326, 6.5985, 0.6667) makes body 4 at (22.2326, 19.0985, 1.3333) makes body 5 at (34.7326, 19.0985, 0.6667) makes body 6 at (22.2326, 6.5985, 0.6667) makes body 7 at (47.2326, 6.5985, 1.3333) makes body 8 at (47.2326, 19.0985, 1.3333) makes body 9 at (9.7326, 6.5985, 1.3333)
extrude "Extrude3" add sketch "Sketch1" along normal blind 1 contours L37 L90 L91 A14 | L69 L90 L91 A14 | L90 L91 A7 A14 | L90 L91 A7 A14 | L65 L94 L95 A8 | L37 L88 L89 A12 | L77 L94 L95 A8 | L69 L88 L89 A12 | L73 L96 L97 L98 A9 | L65 L92 L93 A11 | L85 L96 L98 A9 | L77 L92 L93 A11 | L81 L103 L104 A15 | L73 L99 L100 A10 | L49 L61 L103 L104 A15 | L103 L104 A4 A15 | L85 L99 L100 A10 | L103 L104 A4 A15 | L81 L101 L102 A13 | L49 L61 L101 L102 A13 picked at (3.824, 4.2265) picked at (9.3996, 5.9889) picked at (41.0607, 4.5923) picked at (46.0898, 4.1256) bodies 7 1 3 4 5 6 8 9 2
